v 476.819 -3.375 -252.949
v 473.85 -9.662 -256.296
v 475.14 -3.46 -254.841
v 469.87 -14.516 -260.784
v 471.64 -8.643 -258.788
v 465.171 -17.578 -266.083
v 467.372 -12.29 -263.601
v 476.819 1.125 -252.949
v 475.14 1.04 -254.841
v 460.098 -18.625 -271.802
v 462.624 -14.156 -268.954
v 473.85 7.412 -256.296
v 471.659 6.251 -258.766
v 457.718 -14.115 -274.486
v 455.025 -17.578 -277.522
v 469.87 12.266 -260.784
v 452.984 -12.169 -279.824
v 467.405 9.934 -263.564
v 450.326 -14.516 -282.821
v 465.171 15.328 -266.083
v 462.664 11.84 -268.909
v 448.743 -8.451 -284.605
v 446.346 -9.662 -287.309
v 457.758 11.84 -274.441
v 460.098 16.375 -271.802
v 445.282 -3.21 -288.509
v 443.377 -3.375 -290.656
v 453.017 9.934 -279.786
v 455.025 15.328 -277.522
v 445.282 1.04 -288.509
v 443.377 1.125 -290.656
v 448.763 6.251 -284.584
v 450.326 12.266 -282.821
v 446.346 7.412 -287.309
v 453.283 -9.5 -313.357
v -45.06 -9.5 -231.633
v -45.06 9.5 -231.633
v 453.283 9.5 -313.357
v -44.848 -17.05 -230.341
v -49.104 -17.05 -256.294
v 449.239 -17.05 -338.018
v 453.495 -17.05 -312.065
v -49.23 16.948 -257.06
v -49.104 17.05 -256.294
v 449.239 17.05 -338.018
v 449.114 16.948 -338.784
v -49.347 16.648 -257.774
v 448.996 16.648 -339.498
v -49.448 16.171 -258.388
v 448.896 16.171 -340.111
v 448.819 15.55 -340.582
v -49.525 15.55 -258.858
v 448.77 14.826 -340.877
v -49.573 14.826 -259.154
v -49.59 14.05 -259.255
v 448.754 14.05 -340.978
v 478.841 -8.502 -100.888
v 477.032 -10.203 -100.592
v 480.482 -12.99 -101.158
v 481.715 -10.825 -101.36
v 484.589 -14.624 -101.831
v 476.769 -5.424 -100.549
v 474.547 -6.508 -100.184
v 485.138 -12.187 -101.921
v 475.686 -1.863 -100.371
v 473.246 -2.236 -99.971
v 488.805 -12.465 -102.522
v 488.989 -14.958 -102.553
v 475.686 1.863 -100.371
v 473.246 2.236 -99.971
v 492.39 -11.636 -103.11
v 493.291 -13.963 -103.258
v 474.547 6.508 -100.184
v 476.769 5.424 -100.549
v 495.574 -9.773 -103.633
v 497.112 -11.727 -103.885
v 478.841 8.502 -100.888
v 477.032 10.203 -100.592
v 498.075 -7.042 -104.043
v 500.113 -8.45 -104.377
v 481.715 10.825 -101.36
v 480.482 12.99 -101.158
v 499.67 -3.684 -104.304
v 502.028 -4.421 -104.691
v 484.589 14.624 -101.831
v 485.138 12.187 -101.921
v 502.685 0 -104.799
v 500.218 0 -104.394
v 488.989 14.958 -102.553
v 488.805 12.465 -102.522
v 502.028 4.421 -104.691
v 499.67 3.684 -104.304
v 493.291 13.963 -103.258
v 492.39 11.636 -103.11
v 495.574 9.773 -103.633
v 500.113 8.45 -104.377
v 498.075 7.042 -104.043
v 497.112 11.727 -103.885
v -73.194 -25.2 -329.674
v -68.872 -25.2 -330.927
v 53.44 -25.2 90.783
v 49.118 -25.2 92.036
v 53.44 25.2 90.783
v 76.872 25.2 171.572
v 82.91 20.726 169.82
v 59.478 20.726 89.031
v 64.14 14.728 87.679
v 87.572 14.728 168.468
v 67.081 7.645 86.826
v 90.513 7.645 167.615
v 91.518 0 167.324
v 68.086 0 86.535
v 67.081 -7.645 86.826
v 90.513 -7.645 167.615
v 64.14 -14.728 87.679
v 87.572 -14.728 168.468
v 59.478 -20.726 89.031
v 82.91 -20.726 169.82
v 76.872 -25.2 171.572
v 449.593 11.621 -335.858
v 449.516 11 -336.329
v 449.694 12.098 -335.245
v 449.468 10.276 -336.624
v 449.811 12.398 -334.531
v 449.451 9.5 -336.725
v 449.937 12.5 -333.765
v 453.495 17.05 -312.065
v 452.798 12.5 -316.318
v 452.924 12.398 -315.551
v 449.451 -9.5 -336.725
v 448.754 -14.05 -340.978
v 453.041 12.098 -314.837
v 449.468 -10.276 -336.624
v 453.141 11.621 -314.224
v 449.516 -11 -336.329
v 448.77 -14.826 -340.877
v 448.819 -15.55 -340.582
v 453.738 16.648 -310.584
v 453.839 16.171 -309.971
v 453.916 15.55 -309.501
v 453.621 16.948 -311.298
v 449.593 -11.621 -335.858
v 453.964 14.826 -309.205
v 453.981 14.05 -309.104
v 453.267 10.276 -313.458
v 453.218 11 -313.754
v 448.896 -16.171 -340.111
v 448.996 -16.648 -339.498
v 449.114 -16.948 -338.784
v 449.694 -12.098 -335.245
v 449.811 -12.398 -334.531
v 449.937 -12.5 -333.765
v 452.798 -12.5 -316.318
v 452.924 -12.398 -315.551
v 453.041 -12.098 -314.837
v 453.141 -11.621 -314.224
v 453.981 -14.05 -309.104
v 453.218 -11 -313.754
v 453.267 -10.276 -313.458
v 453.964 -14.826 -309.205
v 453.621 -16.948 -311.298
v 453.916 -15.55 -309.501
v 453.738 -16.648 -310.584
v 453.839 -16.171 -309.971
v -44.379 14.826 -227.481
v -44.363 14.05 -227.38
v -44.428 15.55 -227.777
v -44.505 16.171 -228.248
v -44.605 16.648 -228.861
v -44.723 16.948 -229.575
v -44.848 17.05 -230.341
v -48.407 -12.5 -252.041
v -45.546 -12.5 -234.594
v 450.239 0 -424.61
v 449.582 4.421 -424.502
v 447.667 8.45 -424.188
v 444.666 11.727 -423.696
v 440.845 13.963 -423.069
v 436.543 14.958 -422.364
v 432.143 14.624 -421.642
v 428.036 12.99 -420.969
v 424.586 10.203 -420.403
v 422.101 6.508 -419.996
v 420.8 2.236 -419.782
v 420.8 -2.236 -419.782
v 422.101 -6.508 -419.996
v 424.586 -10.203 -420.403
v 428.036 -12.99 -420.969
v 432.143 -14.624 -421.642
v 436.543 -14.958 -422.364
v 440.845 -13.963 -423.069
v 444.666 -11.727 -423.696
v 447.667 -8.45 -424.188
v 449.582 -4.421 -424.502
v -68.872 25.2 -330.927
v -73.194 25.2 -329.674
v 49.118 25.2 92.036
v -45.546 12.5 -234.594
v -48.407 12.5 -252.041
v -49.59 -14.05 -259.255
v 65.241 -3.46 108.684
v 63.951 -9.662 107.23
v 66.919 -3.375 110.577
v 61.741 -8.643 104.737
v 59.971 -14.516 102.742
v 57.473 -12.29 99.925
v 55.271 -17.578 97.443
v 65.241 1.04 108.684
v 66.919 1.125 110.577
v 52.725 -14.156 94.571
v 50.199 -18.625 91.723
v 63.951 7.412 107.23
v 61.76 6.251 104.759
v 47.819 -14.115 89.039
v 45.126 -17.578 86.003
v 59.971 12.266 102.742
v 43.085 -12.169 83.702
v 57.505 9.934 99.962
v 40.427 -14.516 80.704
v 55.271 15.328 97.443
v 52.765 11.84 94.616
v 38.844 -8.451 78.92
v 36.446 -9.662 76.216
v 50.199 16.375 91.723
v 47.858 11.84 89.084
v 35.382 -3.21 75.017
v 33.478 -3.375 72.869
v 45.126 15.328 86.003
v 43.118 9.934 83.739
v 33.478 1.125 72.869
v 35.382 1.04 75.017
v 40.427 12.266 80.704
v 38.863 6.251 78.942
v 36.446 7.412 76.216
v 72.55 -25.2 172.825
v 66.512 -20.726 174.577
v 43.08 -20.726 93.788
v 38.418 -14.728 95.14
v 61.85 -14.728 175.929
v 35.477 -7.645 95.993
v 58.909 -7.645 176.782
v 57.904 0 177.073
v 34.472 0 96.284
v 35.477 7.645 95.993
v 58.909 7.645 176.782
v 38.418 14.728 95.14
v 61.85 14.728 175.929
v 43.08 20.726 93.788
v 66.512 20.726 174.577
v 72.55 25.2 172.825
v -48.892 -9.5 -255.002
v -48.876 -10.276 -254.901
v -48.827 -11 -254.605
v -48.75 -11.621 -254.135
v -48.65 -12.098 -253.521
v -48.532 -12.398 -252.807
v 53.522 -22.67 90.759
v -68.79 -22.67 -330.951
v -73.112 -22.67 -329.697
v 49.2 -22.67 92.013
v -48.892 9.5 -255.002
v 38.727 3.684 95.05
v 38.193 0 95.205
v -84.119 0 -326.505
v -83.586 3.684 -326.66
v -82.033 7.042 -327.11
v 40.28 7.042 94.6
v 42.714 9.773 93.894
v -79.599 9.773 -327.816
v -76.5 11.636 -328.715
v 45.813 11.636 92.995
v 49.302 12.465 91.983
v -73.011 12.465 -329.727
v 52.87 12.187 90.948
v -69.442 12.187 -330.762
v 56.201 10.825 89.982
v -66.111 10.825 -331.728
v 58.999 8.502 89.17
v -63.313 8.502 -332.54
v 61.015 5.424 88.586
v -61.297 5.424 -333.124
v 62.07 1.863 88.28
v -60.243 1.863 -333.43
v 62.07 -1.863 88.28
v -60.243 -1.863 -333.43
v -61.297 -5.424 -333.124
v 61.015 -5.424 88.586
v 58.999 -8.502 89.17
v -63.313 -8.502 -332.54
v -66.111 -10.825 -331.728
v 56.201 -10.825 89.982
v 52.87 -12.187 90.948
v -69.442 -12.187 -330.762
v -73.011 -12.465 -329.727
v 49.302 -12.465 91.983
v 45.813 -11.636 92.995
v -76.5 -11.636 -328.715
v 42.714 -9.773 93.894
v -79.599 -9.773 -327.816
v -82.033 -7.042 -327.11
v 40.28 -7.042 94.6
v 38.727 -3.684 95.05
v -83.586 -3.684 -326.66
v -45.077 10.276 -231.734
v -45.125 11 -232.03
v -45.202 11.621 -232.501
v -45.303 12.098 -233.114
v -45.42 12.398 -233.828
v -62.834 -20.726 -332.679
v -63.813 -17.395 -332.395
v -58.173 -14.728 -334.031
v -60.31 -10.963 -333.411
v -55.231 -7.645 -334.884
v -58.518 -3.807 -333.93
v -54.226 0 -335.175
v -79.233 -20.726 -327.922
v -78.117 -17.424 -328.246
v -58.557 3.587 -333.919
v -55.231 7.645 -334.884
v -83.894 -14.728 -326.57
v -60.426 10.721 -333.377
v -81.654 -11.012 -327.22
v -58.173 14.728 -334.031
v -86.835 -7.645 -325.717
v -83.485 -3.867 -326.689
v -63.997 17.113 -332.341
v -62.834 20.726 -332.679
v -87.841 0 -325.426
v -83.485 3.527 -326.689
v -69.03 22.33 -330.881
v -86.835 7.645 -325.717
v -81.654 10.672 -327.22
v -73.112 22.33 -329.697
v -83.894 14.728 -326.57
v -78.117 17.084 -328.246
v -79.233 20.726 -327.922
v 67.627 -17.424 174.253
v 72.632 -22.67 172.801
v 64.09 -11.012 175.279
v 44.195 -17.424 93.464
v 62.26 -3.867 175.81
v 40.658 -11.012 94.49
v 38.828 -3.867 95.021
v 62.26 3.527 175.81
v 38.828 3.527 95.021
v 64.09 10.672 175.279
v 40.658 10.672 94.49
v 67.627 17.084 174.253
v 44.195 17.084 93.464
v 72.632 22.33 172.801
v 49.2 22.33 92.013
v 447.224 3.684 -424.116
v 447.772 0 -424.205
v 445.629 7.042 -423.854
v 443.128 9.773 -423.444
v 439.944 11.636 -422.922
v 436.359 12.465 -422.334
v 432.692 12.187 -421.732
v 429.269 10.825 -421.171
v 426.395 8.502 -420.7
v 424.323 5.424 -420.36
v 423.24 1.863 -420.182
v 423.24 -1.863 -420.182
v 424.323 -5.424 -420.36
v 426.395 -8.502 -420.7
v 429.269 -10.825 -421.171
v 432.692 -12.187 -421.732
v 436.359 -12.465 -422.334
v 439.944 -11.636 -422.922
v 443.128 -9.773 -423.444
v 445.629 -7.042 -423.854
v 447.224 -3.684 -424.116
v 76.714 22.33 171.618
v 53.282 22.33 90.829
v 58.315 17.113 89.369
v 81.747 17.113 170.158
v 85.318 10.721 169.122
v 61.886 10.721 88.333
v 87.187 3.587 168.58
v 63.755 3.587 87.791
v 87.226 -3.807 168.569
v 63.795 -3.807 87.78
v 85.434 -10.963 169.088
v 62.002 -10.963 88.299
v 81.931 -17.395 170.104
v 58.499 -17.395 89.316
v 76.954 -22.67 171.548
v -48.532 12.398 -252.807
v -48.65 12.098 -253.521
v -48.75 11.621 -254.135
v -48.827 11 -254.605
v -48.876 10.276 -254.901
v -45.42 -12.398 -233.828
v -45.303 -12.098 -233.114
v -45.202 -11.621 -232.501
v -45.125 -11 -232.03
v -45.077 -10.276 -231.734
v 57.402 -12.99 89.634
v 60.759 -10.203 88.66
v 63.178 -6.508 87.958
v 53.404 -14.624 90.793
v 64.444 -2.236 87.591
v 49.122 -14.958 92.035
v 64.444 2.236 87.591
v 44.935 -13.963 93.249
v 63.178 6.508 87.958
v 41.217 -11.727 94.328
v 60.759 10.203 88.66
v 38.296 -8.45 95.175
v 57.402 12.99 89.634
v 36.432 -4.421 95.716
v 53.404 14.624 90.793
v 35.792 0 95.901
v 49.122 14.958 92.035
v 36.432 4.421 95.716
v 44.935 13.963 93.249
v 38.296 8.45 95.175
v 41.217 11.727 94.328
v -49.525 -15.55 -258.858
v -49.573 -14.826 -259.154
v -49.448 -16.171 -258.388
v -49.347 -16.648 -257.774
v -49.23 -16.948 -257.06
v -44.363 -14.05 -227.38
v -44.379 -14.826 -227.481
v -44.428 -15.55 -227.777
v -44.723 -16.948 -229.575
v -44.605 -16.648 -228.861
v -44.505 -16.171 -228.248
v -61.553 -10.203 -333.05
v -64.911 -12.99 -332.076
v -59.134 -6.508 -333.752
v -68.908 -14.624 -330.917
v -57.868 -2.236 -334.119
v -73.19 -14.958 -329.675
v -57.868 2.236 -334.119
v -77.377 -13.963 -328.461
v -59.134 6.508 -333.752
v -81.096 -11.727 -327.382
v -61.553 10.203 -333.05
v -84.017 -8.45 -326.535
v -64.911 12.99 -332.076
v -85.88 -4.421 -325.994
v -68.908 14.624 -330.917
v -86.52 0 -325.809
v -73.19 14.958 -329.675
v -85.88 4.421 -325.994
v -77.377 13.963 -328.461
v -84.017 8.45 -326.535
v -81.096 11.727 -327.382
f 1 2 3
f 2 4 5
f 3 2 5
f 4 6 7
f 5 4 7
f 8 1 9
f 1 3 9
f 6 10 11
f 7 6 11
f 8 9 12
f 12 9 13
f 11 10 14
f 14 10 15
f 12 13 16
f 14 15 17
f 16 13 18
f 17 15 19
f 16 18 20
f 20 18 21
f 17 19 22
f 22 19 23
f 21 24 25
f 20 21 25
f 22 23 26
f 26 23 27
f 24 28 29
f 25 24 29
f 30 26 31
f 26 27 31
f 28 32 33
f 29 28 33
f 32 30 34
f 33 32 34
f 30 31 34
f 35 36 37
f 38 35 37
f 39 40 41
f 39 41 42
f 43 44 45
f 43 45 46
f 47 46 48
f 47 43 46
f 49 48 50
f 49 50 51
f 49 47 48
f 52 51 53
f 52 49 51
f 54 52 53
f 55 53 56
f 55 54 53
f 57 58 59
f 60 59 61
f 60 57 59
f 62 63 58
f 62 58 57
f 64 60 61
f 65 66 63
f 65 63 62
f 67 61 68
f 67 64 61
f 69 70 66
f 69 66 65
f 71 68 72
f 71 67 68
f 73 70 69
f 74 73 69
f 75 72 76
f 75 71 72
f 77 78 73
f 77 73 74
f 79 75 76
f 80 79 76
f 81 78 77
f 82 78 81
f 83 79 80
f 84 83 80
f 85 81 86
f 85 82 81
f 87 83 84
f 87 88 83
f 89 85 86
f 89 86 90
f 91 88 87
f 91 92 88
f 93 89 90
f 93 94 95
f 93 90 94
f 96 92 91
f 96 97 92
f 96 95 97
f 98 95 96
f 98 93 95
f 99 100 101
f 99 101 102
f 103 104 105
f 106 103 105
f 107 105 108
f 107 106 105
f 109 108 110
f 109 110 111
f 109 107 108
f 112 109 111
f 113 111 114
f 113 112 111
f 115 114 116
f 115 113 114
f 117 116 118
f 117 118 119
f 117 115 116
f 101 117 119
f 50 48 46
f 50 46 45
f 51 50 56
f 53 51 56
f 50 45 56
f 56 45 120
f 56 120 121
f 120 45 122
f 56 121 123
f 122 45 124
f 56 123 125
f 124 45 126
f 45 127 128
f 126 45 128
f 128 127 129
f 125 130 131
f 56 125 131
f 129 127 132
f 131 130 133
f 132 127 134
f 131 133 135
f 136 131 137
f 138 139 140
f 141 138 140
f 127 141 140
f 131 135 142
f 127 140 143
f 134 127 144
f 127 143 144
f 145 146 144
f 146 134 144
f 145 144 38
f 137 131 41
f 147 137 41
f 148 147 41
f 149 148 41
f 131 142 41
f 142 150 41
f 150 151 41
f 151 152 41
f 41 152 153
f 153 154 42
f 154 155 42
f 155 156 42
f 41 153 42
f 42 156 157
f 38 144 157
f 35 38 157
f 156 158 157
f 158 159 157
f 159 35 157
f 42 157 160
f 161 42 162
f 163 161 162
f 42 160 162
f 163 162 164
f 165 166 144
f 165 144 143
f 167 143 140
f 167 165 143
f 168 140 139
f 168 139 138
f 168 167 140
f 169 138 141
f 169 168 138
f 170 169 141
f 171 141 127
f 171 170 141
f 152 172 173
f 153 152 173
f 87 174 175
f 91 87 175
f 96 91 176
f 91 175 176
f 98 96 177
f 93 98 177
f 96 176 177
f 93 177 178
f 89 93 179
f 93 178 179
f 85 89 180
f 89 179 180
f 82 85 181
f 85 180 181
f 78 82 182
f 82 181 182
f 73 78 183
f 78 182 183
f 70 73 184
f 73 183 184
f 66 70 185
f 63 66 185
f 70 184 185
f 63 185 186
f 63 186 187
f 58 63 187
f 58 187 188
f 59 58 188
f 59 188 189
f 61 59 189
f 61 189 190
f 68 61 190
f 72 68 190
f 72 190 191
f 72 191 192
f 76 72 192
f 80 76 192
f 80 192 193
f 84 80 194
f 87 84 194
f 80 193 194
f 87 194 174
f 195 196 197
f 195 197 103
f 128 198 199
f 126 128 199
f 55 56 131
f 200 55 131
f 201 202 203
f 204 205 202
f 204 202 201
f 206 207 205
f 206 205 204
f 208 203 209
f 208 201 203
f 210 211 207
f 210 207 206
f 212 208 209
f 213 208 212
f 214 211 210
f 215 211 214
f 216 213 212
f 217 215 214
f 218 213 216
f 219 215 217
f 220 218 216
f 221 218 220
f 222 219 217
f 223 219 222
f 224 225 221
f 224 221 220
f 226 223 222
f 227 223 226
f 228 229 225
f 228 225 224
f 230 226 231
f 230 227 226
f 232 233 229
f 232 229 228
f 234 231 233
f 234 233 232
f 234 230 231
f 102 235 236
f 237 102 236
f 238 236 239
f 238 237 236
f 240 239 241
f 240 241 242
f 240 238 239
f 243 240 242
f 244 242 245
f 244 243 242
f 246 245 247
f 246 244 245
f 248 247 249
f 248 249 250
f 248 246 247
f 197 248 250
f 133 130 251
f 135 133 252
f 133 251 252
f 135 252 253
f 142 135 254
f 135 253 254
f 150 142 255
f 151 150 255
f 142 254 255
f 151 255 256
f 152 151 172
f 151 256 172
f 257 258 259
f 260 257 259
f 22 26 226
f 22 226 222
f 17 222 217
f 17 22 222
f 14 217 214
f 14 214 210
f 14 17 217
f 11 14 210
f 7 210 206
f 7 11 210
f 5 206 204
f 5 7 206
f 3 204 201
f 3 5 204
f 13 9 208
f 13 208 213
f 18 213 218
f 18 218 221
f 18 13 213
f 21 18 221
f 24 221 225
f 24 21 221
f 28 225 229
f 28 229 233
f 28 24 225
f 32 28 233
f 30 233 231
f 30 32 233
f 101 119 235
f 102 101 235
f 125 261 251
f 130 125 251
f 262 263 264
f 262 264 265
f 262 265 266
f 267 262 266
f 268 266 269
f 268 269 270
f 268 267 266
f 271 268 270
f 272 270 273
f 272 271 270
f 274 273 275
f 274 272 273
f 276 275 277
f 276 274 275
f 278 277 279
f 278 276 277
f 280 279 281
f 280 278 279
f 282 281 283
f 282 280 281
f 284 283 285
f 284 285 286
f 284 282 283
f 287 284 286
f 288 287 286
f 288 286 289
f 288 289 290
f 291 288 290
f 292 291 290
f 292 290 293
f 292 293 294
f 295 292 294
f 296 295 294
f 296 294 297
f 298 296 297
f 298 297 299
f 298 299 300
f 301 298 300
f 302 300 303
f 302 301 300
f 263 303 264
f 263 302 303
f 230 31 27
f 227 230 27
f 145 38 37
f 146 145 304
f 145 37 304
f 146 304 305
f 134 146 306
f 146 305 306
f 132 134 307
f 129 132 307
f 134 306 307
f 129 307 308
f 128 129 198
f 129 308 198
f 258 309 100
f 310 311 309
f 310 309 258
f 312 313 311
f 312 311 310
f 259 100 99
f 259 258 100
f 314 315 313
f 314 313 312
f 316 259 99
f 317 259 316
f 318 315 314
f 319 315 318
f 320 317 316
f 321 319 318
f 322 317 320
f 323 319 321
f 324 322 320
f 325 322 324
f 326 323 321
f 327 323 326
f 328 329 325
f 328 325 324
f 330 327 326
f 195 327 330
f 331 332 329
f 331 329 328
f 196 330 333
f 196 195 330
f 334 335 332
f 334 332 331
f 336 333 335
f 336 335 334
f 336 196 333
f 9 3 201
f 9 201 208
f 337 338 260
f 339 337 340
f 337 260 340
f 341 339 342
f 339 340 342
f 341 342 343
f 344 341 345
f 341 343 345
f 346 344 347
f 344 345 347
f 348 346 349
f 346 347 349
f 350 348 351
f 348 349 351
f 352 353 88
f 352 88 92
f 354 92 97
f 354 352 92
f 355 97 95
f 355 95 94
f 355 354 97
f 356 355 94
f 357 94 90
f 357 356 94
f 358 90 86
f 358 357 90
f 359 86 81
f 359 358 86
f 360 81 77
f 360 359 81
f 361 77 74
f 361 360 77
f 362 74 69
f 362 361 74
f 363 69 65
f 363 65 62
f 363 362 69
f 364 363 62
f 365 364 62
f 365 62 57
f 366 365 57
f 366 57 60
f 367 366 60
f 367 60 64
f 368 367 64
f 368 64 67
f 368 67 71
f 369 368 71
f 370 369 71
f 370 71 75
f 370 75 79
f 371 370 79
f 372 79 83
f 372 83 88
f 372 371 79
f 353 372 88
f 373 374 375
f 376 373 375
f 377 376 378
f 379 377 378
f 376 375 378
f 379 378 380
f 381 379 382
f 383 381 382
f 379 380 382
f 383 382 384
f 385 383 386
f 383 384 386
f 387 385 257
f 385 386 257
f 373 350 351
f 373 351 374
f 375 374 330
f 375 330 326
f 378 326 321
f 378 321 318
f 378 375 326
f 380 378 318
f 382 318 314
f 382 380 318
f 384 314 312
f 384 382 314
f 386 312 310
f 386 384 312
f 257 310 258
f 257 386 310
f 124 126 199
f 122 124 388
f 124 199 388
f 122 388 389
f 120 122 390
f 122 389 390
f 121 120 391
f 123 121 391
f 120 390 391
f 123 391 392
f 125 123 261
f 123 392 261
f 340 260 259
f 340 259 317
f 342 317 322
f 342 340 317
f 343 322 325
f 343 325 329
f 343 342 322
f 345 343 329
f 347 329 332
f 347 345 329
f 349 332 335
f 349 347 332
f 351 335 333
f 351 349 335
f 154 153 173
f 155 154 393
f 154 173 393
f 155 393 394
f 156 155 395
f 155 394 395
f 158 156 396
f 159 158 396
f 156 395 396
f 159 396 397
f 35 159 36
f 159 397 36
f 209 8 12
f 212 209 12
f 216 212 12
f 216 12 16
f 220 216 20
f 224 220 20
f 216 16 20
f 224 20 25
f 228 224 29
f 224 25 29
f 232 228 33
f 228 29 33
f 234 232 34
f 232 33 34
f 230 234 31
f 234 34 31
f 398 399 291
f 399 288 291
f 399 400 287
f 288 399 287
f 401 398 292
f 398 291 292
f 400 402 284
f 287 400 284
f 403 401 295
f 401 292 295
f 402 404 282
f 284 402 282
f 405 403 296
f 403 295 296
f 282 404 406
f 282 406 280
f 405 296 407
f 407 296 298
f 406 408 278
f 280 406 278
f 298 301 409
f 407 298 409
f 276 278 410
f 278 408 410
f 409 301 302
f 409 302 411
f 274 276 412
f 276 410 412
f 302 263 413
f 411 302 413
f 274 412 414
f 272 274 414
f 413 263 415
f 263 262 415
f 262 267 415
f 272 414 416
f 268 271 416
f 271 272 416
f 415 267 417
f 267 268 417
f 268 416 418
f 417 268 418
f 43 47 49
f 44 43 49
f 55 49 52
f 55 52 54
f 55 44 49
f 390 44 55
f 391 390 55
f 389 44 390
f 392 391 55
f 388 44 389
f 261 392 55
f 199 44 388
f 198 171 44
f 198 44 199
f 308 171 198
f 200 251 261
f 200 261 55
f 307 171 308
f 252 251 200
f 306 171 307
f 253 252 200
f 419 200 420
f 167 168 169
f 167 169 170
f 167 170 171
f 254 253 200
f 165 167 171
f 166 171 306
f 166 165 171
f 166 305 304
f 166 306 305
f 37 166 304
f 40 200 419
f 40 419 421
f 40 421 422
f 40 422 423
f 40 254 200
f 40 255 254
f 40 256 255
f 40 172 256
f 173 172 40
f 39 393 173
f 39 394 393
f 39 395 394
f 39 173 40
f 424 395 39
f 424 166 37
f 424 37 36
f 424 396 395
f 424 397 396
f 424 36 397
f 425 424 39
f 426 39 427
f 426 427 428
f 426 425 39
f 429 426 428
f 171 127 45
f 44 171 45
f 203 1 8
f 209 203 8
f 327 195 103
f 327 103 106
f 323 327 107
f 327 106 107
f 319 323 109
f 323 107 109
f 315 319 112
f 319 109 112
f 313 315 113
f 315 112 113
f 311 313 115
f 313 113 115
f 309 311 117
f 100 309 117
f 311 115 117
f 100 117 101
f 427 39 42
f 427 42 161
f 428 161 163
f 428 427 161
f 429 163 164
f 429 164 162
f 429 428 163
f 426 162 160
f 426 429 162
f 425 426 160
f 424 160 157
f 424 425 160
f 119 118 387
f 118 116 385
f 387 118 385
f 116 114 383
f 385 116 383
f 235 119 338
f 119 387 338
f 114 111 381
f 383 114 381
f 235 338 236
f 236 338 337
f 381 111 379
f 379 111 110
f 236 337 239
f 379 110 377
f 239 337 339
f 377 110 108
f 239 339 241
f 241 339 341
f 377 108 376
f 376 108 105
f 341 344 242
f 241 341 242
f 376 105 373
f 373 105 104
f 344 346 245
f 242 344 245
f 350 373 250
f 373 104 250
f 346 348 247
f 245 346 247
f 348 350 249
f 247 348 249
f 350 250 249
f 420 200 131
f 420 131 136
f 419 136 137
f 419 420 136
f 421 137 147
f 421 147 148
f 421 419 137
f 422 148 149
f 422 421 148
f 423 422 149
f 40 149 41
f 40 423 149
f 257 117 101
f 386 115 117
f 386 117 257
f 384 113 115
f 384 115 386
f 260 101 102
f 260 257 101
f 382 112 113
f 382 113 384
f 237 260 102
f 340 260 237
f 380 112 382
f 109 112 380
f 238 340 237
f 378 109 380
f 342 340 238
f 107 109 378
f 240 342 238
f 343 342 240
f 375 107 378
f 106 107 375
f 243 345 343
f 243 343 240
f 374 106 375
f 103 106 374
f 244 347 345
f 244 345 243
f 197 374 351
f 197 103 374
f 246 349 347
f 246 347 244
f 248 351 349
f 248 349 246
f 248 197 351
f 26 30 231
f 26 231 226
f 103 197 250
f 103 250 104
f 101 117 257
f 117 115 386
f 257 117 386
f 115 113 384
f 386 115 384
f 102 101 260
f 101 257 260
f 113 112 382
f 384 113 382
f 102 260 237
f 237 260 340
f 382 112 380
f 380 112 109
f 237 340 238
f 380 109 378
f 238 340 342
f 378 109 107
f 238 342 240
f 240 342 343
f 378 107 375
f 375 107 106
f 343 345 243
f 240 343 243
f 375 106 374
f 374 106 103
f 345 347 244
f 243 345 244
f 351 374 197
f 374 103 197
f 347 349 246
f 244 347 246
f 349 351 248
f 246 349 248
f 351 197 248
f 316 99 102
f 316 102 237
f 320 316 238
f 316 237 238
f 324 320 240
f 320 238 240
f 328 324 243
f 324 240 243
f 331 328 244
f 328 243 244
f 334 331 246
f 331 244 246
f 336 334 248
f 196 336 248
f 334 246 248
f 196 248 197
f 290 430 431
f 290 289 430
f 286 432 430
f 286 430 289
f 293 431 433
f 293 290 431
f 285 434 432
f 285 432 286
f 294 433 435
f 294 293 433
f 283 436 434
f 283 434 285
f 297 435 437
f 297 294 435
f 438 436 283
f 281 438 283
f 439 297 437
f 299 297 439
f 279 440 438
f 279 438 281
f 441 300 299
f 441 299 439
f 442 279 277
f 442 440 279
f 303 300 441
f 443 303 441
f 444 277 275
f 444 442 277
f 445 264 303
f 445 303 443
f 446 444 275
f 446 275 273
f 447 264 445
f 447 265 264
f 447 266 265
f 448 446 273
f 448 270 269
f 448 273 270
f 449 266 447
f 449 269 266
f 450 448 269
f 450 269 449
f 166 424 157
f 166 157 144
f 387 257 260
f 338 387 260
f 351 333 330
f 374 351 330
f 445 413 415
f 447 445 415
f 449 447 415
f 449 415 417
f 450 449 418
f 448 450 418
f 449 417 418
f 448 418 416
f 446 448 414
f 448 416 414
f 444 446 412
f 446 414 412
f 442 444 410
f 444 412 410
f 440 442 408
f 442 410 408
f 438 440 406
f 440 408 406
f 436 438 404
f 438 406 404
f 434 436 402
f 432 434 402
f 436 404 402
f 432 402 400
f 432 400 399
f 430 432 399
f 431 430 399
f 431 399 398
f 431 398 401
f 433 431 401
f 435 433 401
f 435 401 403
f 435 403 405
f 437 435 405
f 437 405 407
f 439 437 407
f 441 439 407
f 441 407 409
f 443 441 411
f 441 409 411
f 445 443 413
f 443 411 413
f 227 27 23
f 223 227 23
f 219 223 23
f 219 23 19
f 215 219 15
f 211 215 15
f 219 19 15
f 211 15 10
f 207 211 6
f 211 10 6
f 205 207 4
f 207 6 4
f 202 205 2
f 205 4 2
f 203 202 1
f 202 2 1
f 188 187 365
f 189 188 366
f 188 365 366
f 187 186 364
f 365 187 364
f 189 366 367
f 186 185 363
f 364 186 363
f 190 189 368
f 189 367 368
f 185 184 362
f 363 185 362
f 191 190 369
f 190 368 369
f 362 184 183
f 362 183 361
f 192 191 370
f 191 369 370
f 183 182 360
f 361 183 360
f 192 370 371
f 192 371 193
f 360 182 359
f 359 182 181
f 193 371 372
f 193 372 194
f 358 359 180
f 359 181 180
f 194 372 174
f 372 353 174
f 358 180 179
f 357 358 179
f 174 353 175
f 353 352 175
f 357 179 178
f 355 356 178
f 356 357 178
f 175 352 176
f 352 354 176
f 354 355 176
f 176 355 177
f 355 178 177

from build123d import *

# Parameters (mm, degrees)
SKETCH12_R                         = 15
SKETCH12_R_2                       = 12.5
BACK_FRAME_BACK_FRAME_1_DEPTH      = 439.089643257
SKETCH13_R                         = 15
SKETCH13_R_2                       = 12.5
BACK_FRAME_BACK_FRAME_2_DEPTH      = 324.083071196
TOP_FRAME_TOP_TUBE_1_DEPTH         = 505
LOWER_FRAME_BOTTOM_FRAME_1_DEPTH   = 547.875918564
LOWER_FRAME_BOTTOM_FRAME_2_DEPTH   = 84.118367958
LOWER_FRAME_BOTTOM_FRAME_2_2_DEPTH = 439.089643257


with BuildPart() as part:
    # Sketch12 → Back frame BACK FRAME(1) (new body)
    with BuildSketch(Plane(origin=(50.198693417, 0, 91.722962081), x_dir=(-0.9604190458168814, 0, 0.27855925120553954), z_dir=(-0.2785592512055396, 0, -0.9604190458168815))):
        Circle(SKETCH12_R)
        Circle(SKETCH12_R_2, mode=Mode.SUBTRACT)
    extrude(amount=BACK_FRAME_BACK_FRAME_1_DEPTH)


with BuildPart() as body_2:
    # Sketch13 → Back frame BACK FRAME(2) (new body)
    with BuildSketch(Plane(origin=(435.437022891, 0, -422.182546606), x_dir=(0.9868188241922125, 0, -0.1618289474102196), z_dir=(0.1618289474102196, 0, 0.9868188241922125))):
        Circle(SKETCH13_R)
        Circle(SKETCH13_R_2, mode=Mode.SUBTRACT)
    extrude(amount=BACK_FRAME_BACK_FRAME_2_DEPTH)


with BuildPart() as body_3:
    # Sketch14 → Top frame TOP TUBE(1) (new body)
    with BuildSketch(Plane(origin=(-46.97621709, 0, -243.317552361), x_dir=(0, 1, 0), z_dir=(0.9868188241922123, 0, -0.1618289474102196))):
        with BuildLine():
            Line((-14.05, 16.15), (14.05, 16.15))
            ThreePointArc((14.05, 16.15), (16.171320344, 15.271320344), (17.05, 13.15))
            Line((17.05, 13.15), (17.05, -13.15))
            ThreePointArc((17.05, -13.15), (16.171320344, -15.271320344), (14.05, -16.15))
            Line((14.05, -16.15), (-14.05, -16.15))
            ThreePointArc((-14.05, -16.15), (-16.171320344, -15.271320344), (-17.05, -13.15))
            Line((-17.05, -13.15), (-17.05, 13.15))
            ThreePointArc((-17.05, 13.15), (-16.171320344, 15.271320344), (-14.05, 16.15))
        make_face()
        with BuildLine():
            Line((-9.5, 11.840175953), (9.5, 11.840175953))
            ThreePointArc((9.5, 11.840175953), (11.621320344, 10.961496297), (12.5, 8.840175953))
            Line((12.5, 8.840175953), (12.5, -8.840175953))
            ThreePointArc((12.5, -8.840175953), (11.621320344, -10.961496297), (9.5, -11.840175953))
            Line((9.5, -11.840175953), (-9.5, -11.840175953))
            ThreePointArc((-9.5, -11.840175953), (-11.621320344, -10.961496297), (-12.5, -8.840175953))
            Line((-12.5, -8.840175953), (-12.5, 8.840175953))
            ThreePointArc((-12.5, 8.840175953), (-11.621320344, 10.961496297), (-9.5, 11.840175953))
        make_face(mode=Mode.SUBTRACT)
    extrude(amount=TOP_FRAME_TOP_TUBE_1_DEPTH)


with BuildPart() as body_4:
    # Sketch17 → Lower frame BOTTOM FRAME(1) (new body)
    with BuildSketch(Plane(origin=(460.09796084, 0, -271.802295238), x_dir=(0, 1, 0), z_dir=(-0.7481607669438695, 0, 0.6635174954784245))):
        with BuildLine():
            Line((1.125, 25.2), (-1.125, 25.2))
            Line((-1.125, 25.2), (-3.375, 25.2))
            ThreePointArc((-3.375, 25.2), (-18.625, 0), (-3.375, -25.2))
            Line((-3.375, -25.2), (-1.125, -25.2))
            Line((-1.125, -25.2), (1.125, -25.2))
            ThreePointArc((1.125, -25.2), (16.375, 0), (1.125, 25.2))
        make_face()
        with BuildLine():
            Line((1.03963794, 22.329904981), (-0.96036206, 22.329904981))
            Line((-0.96036206, 22.329904981), (-3.21036206, 22.329904981))
            ThreePointArc((-3.21036206, 22.329904981), (-14.376912625, -0.108753071), (-3.46036206, -22.670095019))
            Line((-3.46036206, -22.670095019), (-1.21036206, -22.670095019))
            Line((-1.21036206, -22.670095019), (1.03963794, -22.670095019))
            ThreePointArc((1.03963794, -22.670095019), (12.080910019, -0.170095019), (1.03963794, 22.329904981))
        make_face(mode=Mode.SUBTRACT)
    extrude(amount=LOWER_FRAME_BOTTOM_FRAME_1_DEPTH)


with BuildPart() as body_5:
    # Sketch18 → Lower frame BOTTOM FRAME(2) (new body)
    with BuildSketch(Plane(origin=(50.198693417, 0, 91.722962081), x_dir=(-0.9604190458168814, 0, 0.27855925120553954), z_dir=(-0.2785592512055396, 0, -0.9604190458168815))):
        with BuildLine():
            Line((1.125, 25.2), (-1.125, 25.2))
            Line((-1.125, 25.2), (-3.375, 25.2))
            ThreePointArc((-3.375, 25.2), (-18.625, 0), (-3.375, -25.2))
            Line((-3.375, -25.2), (-1.125, -25.2))
            Line((-1.125, -25.2), (1.125, -25.2))
            ThreePointArc((1.125, -25.2), (16.375, 0), (1.125, 25.2))
        make_face()
        with BuildLine():
            Line((1.03963794, 22.329904981), (-0.96036206, 22.329904981))
            Line((-0.96036206, 22.329904981), (-3.21036206, 22.329904981))
            ThreePointArc((-3.21036206, 22.329904981), (-14.376912625, -0.108753071), (-3.46036206, -22.670095019))
            Line((-3.46036206, -22.670095019), (-1.21036206, -22.670095019))
            Line((-1.21036206, -22.670095019), (1.03963794, -22.670095019))
            ThreePointArc((1.03963794, -22.670095019), (12.080910019, -0.170095019), (1.03963794, 22.329904981))
        make_face(mode=Mode.SUBTRACT)
    extrude(amount=-LOWER_FRAME_BOTTOM_FRAME_2_DEPTH)


with BuildPart() as body_6:
    # Sketch18 on segment 2 (carried to segment 2) → Lower frame BOTTOM FRAME_2 2 (new body)
    with BuildSketch(Plane(origin=(50.198693417, 0, 91.722962081), x_dir=(-0.960419046, 0, 0.278559251), z_dir=(-0.278559251, 0, -0.960419046))):
        with BuildLine():
            Line((1.125, 25.2), (-1.125, 25.2))
            Line((-1.125, 25.2), (-3.375, 25.2))
            ThreePointArc((-3.375, 25.2), (-18.625, 0), (-3.375, -25.2))
            Line((-3.375, -25.2), (-1.125, -25.2))
            Line((-1.125, -25.2), (1.125, -25.2))
            ThreePointArc((1.125, -25.2), (16.375, 0), (1.125, 25.2))
        make_face()
        with BuildLine():
            Line((1.03963794, 22.329904981), (-0.96036206, 22.329904981))
            Line((-0.96036206, 22.329904981), (-3.21036206, 22.329904981))
            ThreePointArc((-3.21036206, 22.329904981), (-14.376912625, -0.108753071), (-3.46036206, -22.670095019))
            Line((-3.46036206, -22.670095019), (-1.21036206, -22.670095019))
            Line((-1.21036206, -22.670095019), (1.03963794, -22.670095019))
            ThreePointArc((1.03963794, -22.670095019), (12.080910019, -0.170095019), (1.03963794, 22.329904981))
        make_face(mode=Mode.SUBTRACT)
    extrude(amount=LOWER_FRAME_BOTTOM_FRAME_2_2_DEPTH)


solid = Compound([part.part, body_2.part, body_3.part, body_4.part, body_5.part, body_6.part])
